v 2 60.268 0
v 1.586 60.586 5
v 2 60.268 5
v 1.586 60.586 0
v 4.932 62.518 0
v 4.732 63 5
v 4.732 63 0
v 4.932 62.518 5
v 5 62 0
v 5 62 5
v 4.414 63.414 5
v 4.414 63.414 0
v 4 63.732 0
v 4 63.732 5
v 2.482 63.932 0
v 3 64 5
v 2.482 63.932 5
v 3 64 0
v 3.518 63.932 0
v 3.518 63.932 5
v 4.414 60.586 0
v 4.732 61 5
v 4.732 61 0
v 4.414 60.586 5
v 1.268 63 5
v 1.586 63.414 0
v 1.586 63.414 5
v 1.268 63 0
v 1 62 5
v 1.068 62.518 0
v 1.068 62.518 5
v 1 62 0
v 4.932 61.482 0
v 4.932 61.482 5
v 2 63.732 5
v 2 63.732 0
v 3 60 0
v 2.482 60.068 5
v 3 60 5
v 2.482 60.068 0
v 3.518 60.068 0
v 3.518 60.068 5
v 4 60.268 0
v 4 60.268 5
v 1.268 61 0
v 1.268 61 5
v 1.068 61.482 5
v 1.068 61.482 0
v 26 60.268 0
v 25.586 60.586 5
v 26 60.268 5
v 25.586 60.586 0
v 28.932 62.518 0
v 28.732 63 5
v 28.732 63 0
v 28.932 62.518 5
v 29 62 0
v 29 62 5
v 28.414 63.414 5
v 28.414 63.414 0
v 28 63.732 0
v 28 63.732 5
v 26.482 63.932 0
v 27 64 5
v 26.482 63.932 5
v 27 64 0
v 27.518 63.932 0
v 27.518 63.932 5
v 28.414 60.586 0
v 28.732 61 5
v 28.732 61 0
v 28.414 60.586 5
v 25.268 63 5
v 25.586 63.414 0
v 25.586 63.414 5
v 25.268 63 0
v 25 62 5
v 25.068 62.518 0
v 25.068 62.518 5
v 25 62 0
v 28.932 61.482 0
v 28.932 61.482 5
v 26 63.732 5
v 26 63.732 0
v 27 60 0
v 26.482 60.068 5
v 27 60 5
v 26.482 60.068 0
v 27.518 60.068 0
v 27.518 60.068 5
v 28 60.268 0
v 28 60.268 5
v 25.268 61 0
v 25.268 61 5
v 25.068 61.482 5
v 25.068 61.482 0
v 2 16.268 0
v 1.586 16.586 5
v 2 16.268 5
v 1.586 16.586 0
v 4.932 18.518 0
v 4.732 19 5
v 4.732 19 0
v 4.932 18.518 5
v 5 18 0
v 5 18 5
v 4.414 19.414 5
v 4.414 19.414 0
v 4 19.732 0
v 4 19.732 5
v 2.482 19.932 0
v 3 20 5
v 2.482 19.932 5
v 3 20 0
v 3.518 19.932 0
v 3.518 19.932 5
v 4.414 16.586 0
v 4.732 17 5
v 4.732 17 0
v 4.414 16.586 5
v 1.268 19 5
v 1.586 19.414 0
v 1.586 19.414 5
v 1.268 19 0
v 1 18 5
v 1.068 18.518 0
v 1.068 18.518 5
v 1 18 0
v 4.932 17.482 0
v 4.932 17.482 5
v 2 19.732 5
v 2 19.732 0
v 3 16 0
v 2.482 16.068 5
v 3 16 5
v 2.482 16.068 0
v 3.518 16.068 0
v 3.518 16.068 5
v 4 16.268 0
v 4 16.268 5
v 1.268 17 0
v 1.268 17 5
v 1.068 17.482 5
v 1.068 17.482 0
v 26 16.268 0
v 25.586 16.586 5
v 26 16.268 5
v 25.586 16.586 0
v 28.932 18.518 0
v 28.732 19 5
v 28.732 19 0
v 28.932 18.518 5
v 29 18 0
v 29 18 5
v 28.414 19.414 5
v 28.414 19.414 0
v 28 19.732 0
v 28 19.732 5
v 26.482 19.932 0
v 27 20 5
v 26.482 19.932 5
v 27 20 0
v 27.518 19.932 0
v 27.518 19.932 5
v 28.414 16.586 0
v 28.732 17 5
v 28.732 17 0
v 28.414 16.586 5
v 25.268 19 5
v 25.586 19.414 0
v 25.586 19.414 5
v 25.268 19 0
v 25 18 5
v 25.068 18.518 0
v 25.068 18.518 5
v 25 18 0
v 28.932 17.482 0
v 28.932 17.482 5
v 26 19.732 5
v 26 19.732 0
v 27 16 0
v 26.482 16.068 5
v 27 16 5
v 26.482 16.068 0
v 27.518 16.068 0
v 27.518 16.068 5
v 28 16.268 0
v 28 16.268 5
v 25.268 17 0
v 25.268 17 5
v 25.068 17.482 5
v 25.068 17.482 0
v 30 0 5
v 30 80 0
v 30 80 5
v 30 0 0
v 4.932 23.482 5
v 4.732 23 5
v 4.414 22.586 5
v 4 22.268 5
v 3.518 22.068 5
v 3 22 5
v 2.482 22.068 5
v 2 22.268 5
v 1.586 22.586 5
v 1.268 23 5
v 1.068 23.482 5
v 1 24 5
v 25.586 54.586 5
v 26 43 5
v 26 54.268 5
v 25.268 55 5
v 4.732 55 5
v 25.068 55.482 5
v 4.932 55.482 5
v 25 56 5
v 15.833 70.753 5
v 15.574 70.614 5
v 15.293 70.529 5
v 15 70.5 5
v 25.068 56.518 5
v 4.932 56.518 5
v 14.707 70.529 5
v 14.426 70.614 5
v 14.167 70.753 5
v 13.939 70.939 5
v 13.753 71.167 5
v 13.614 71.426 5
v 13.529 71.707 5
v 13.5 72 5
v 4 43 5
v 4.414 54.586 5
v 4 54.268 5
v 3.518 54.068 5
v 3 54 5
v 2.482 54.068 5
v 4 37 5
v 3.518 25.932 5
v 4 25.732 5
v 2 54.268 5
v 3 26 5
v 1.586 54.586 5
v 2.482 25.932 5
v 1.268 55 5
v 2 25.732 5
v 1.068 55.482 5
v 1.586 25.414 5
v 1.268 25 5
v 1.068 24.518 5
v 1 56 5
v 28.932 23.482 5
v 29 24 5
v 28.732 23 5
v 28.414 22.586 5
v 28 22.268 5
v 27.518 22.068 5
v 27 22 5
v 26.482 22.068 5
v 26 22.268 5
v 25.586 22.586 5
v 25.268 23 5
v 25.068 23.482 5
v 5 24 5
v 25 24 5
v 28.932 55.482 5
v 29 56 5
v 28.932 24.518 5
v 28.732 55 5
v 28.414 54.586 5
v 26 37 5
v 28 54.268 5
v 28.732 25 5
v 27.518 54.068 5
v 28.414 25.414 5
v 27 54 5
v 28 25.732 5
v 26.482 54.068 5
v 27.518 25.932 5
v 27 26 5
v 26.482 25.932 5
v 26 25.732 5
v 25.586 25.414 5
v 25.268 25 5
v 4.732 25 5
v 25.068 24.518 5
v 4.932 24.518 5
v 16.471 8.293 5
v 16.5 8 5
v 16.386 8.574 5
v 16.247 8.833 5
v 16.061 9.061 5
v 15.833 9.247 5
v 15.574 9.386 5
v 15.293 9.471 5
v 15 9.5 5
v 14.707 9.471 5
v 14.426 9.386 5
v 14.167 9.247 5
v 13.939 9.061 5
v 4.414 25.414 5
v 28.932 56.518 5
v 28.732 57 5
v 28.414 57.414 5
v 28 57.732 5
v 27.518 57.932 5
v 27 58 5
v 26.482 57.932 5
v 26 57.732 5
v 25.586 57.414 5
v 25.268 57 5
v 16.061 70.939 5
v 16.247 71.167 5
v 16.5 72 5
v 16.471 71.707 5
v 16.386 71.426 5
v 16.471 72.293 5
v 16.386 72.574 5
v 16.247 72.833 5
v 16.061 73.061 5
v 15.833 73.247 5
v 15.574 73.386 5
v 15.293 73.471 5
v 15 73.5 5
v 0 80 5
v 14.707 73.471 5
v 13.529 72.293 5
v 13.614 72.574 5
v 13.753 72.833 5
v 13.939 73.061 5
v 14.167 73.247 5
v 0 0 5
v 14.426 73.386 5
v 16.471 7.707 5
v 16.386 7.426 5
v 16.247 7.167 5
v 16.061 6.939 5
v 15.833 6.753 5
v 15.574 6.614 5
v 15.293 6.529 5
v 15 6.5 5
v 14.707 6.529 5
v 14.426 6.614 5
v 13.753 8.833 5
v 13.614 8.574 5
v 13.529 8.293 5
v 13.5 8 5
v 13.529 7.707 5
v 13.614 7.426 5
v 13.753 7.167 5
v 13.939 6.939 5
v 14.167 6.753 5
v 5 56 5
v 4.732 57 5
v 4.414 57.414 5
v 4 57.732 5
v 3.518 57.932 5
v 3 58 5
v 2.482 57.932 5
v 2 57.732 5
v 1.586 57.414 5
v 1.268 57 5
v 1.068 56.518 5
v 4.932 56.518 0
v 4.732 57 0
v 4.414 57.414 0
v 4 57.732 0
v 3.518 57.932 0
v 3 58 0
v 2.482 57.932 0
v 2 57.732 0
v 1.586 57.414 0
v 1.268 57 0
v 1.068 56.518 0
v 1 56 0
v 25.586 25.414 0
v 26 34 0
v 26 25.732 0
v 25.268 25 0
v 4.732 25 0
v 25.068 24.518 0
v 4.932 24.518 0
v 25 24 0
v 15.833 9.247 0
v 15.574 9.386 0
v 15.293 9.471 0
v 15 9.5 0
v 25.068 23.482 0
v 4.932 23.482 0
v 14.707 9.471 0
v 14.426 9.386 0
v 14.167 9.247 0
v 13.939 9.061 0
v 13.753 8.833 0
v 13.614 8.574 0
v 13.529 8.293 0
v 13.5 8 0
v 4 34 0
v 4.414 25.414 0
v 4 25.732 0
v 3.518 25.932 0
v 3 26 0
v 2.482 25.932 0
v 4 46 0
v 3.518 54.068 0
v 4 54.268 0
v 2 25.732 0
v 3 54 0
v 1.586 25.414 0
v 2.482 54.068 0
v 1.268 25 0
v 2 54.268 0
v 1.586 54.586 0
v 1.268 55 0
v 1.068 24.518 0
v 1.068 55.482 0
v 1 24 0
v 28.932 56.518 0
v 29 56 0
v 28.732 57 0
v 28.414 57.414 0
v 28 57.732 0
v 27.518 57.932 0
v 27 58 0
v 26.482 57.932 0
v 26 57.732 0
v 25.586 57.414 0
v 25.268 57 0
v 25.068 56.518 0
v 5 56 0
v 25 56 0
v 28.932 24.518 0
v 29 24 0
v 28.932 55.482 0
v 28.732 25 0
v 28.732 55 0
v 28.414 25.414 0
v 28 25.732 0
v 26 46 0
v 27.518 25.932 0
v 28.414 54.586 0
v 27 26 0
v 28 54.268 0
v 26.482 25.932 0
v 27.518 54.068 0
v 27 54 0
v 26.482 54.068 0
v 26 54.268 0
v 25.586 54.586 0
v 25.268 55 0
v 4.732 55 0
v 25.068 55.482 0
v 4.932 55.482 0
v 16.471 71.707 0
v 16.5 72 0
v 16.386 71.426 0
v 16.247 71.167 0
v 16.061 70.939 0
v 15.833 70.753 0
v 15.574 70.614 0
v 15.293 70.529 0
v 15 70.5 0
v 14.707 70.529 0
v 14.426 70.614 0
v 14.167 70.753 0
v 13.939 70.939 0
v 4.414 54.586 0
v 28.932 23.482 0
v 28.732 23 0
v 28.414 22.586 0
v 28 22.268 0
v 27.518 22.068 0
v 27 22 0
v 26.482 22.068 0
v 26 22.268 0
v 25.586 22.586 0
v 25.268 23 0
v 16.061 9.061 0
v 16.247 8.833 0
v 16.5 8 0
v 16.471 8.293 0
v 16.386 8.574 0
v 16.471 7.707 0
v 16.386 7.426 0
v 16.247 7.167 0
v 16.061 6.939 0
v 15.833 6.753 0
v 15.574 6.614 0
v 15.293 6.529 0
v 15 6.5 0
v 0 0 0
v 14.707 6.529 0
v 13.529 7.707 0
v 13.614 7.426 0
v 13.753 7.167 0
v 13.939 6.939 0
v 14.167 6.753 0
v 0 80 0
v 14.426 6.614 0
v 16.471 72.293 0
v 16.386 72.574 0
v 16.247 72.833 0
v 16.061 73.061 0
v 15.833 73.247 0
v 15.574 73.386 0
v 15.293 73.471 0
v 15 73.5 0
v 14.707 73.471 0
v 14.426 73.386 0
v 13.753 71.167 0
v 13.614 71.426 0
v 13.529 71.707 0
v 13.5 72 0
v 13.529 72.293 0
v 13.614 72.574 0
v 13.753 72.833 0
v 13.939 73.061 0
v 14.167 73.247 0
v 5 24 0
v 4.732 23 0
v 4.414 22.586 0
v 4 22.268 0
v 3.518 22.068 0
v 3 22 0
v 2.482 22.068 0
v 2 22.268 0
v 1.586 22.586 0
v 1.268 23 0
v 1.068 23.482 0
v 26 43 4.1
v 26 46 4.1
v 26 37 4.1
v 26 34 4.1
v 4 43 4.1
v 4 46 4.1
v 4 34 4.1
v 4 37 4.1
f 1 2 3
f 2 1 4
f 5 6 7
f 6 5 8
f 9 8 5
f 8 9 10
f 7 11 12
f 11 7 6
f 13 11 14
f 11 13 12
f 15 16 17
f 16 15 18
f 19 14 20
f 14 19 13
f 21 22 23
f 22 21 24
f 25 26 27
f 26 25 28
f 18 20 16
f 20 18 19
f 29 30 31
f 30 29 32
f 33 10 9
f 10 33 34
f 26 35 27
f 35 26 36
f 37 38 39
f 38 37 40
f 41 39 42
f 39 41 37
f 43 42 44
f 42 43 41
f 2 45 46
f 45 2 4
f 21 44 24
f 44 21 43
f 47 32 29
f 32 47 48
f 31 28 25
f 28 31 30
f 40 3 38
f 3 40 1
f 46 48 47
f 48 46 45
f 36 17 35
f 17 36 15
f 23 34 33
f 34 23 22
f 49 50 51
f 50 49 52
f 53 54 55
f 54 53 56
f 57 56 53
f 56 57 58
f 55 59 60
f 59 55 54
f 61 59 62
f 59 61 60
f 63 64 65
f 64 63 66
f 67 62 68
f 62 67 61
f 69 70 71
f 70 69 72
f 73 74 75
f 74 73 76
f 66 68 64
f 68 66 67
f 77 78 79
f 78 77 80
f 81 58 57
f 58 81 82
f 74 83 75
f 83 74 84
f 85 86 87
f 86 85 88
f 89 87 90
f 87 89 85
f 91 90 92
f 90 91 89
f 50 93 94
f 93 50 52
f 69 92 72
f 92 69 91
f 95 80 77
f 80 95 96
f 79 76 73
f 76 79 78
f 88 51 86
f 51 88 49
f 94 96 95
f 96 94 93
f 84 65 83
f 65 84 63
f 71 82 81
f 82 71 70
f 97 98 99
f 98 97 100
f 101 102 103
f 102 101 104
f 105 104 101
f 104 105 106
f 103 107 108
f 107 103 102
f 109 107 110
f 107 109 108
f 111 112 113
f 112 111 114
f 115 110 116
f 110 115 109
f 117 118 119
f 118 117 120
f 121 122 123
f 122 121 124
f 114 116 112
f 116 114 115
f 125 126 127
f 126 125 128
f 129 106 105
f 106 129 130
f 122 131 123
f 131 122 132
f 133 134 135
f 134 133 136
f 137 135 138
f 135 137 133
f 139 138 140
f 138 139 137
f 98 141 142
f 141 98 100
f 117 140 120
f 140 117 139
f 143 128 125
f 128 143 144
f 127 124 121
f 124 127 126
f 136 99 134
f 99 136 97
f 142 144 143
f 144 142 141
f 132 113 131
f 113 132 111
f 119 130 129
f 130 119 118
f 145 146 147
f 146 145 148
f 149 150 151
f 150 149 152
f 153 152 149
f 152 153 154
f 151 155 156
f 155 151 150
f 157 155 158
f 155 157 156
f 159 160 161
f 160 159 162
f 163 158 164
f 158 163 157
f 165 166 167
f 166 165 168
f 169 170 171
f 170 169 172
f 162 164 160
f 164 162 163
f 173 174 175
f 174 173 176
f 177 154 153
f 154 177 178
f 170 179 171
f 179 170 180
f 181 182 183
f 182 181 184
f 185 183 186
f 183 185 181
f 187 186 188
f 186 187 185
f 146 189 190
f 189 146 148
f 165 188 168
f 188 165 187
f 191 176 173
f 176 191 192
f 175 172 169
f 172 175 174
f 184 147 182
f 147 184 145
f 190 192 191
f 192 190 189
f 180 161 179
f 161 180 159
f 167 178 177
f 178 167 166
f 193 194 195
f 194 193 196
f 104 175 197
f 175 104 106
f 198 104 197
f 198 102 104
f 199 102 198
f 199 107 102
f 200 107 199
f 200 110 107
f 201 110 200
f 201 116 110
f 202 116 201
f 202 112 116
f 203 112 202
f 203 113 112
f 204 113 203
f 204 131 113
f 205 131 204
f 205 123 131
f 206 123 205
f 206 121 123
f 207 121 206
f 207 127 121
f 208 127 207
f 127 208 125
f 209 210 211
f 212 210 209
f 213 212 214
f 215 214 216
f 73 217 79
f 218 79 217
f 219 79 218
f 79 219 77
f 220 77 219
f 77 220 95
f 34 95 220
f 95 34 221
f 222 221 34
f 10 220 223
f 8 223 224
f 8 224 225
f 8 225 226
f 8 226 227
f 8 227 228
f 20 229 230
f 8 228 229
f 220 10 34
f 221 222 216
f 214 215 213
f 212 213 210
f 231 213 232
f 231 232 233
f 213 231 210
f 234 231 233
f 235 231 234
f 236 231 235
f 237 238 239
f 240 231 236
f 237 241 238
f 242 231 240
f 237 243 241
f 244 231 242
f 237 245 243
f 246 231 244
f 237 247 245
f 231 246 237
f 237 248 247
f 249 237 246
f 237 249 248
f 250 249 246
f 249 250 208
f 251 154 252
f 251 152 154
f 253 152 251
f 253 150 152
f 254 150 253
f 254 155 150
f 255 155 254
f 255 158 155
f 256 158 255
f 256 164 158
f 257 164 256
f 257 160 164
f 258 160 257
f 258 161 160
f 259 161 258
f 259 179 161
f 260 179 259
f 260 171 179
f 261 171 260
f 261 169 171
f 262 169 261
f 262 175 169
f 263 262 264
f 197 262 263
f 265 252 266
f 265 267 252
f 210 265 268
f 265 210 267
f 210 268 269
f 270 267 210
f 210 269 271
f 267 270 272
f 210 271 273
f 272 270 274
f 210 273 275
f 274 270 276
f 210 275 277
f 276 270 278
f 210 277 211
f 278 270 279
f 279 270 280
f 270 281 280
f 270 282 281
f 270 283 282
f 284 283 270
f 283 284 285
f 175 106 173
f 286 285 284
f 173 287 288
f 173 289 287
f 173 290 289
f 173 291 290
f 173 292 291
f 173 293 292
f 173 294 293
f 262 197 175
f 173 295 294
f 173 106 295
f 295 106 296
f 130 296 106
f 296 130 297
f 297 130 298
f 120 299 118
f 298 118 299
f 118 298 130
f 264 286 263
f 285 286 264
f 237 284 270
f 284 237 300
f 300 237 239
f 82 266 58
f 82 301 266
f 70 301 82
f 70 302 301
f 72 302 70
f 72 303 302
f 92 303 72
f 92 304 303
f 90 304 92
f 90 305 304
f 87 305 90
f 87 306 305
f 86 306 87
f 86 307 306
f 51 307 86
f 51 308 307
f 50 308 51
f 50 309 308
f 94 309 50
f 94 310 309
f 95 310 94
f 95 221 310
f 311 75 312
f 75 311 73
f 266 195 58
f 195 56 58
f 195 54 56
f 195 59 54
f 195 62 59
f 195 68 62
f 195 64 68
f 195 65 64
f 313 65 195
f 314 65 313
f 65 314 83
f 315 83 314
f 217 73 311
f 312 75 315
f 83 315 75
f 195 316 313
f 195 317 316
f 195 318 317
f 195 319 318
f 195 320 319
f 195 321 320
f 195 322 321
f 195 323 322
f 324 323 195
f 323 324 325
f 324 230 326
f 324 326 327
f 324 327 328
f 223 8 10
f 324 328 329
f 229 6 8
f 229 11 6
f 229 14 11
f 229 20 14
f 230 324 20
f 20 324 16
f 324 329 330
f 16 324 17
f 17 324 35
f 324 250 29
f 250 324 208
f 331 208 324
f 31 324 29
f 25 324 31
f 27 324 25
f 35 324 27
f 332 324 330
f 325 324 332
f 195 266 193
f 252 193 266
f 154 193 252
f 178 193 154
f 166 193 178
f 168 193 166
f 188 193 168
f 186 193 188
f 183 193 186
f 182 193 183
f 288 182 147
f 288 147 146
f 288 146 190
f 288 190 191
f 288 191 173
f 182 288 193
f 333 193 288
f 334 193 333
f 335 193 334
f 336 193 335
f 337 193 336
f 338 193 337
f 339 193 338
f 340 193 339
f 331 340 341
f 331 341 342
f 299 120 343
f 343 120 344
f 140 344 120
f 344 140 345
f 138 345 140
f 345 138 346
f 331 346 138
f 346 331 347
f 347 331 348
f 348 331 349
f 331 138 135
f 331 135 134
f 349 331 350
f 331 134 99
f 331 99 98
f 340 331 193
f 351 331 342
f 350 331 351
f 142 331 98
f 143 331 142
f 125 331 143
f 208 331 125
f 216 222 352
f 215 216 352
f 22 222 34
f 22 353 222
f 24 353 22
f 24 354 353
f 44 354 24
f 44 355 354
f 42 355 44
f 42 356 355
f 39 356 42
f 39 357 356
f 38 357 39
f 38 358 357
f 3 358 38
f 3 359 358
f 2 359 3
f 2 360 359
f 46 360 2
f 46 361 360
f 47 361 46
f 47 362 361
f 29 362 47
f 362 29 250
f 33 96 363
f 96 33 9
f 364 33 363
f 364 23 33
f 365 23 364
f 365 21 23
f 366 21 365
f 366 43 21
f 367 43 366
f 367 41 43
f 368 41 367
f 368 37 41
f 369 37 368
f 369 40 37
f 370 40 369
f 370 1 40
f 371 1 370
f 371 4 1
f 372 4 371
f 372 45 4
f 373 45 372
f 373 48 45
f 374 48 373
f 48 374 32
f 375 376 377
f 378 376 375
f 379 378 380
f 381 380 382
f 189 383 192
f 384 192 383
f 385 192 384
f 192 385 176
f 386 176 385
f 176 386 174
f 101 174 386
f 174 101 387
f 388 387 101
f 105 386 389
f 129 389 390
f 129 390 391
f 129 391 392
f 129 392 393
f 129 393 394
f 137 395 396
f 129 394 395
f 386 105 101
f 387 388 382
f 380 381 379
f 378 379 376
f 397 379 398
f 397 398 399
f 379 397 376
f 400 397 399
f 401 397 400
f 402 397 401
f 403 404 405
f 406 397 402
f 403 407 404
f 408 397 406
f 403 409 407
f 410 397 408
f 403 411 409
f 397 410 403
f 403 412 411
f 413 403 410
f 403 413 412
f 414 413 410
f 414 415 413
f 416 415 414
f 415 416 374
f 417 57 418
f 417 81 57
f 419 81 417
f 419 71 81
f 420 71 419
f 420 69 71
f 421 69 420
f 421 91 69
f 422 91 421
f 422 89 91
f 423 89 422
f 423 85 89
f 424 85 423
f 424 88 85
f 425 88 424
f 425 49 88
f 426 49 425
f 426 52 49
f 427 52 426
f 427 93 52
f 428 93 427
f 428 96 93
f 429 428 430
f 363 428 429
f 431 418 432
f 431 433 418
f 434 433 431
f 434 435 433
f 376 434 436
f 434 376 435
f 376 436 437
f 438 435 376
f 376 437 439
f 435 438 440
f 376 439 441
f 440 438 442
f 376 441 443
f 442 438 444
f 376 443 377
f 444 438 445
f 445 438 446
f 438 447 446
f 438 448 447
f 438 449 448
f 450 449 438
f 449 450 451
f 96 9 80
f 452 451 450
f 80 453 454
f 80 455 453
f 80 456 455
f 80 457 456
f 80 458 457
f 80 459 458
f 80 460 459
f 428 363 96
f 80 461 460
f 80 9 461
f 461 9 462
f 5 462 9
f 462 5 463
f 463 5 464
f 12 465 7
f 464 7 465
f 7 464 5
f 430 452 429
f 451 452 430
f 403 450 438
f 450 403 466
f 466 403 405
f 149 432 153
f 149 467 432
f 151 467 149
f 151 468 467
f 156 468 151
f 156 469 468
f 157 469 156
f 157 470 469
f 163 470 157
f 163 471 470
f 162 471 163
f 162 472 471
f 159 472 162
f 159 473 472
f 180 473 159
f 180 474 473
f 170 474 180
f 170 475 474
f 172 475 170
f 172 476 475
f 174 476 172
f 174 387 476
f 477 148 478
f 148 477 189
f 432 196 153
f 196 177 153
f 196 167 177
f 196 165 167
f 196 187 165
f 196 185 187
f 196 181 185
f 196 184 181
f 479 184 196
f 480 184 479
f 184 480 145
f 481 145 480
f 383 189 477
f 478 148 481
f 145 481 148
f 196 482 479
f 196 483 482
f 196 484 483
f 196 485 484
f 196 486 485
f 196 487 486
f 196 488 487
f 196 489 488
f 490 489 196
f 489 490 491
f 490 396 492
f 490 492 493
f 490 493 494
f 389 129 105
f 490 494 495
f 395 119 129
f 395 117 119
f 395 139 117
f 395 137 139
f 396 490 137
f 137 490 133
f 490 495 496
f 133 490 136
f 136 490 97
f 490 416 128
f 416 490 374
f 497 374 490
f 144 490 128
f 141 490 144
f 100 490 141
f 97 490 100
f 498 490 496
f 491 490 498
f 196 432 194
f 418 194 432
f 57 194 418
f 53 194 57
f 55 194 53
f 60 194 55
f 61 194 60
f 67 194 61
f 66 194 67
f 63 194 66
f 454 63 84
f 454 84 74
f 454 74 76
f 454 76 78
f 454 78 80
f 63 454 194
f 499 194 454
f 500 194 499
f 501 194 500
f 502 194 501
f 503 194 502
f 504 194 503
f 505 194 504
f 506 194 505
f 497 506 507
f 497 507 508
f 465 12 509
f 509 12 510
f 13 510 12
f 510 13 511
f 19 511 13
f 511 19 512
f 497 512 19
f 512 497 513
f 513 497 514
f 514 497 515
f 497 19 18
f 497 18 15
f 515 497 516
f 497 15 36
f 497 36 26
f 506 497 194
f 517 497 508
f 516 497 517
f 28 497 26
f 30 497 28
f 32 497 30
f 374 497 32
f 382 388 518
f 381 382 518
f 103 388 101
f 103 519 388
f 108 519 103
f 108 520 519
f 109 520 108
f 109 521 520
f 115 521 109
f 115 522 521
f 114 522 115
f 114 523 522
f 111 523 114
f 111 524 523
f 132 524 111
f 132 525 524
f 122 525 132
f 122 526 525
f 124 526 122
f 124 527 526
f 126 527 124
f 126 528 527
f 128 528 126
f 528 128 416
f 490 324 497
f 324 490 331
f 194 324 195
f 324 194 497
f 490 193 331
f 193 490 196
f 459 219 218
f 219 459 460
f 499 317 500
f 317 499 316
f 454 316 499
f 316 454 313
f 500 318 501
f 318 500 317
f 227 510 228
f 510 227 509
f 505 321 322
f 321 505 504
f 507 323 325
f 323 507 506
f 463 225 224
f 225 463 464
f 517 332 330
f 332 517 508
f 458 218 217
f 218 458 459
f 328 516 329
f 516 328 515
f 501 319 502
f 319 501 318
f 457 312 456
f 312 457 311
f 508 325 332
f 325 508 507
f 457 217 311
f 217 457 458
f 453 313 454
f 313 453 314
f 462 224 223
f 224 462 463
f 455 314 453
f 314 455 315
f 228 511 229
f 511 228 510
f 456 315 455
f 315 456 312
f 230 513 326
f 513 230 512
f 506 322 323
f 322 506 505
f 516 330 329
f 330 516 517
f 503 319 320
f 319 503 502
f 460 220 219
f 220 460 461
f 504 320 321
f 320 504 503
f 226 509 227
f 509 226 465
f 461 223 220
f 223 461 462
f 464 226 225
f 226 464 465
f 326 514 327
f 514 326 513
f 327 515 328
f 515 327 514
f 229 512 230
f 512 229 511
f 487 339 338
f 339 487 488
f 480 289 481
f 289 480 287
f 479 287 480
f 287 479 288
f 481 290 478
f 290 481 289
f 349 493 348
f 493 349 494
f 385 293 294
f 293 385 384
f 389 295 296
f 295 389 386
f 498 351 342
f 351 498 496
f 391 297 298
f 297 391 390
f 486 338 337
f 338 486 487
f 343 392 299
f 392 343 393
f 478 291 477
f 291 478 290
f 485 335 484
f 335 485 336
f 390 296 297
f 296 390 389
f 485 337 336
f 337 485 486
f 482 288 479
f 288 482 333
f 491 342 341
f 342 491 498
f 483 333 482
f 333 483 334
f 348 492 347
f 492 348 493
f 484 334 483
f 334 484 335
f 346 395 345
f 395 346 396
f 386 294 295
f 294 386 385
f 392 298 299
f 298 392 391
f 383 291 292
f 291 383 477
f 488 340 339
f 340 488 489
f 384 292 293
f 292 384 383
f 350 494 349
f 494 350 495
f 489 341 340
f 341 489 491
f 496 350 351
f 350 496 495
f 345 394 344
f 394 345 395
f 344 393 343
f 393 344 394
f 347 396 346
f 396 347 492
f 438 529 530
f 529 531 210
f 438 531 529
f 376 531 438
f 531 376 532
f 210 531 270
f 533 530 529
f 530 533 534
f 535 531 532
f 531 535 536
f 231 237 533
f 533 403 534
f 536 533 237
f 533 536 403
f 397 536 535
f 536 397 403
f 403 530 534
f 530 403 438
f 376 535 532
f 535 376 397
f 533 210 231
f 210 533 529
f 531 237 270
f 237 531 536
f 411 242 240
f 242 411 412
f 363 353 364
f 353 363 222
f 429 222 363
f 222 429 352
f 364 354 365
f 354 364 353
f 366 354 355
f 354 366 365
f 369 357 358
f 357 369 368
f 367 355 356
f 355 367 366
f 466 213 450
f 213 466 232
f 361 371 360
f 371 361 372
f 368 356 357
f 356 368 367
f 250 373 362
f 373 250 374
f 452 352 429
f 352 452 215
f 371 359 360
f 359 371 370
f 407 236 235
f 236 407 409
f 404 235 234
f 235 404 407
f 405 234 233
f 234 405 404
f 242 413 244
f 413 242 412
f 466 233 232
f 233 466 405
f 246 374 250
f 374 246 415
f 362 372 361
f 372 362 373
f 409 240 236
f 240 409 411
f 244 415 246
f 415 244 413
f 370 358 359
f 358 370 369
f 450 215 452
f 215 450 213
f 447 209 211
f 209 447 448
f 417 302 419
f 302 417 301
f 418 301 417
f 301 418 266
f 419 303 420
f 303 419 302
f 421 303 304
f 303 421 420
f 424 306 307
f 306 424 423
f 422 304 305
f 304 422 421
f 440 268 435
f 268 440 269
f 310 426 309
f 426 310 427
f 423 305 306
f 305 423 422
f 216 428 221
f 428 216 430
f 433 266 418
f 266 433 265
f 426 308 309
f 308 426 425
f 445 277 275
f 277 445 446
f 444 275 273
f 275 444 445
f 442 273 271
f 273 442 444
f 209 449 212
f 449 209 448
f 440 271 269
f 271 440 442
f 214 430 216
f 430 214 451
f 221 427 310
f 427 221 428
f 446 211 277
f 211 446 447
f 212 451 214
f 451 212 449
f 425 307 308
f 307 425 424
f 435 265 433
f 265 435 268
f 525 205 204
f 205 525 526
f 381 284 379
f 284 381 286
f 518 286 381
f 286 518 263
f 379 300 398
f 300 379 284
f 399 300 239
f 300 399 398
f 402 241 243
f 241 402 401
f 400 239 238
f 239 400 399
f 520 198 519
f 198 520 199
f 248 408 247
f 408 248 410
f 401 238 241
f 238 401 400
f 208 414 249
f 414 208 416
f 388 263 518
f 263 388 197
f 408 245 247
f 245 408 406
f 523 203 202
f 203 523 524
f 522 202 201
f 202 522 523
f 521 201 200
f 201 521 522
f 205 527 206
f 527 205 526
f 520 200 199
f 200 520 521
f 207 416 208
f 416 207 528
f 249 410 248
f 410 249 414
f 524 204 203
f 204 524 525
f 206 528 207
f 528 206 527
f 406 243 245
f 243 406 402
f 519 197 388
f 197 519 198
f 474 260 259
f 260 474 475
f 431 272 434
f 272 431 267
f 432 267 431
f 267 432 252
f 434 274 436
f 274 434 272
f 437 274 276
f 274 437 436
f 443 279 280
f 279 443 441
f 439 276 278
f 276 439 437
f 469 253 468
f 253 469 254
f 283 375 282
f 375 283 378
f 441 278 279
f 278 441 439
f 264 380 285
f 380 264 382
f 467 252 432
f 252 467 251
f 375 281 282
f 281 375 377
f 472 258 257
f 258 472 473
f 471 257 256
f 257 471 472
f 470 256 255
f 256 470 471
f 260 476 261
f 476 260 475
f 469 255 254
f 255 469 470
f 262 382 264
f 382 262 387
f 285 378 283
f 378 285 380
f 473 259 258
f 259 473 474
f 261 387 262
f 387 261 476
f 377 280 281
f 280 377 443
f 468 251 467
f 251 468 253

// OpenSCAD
//
// 6m Vertical Dipole Center Insulator
// For dual-banana-to-BNC adapter + wire elements
// N1RWJ helper
//

// ---------------------
// Parameters
// ---------------------

plate_width      = 30;   // mm
plate_height     = 80;   // mm
plate_thickness  = 5;    // mm

// Wire holes
wire_hole_d      = 3;    // diameter for 22 AWG with insulation
wire_margin      = 8;    // distance from top/bottom edge to hole center

// Banana adapter slot (approx; tweak if needed)
banana_slot_width  = 22; // left-right opening for adapter body
banana_slot_height = 12; // up-down opening for adapter body
banana_slot_depth  = 4;  // how deep the recess is (into plate thickness)

// Vertical position of slot center (in mm from bottom)
banana_slot_center_y = plate_height / 2;

// Zip-tie holes
zip_hole_d         = 4;  // for typical small zip ties
zip_hole_offset_y  = 10; // vertical spacing above/below slot
zip_hole_edge_margin = 3; // distance from plate side edge

// Optional: mast lash holes (for lashing to mast)
// Turn off if you don't need them
enable_mast_holes = true;
mast_hole_d       = 4;
// Keep these farther from the zip holes to avoid overlap
mast_hole_offset_y = 18;

// ---------------------
// Main model
// ---------------------

difference() {
    // Base plate
    cube([plate_width, plate_height, plate_thickness], center = false);

    // -----------------
    // Wire holes
    // -----------------
    // Top wire hole (upper element)
    translate([plate_width/2, plate_height - wire_margin, plate_thickness/2])
        cylinder(d = wire_hole_d, h = plate_thickness + 0.2, center = true, $fn=32);

    // Bottom wire hole (lower element)
    translate([plate_width/2, wire_margin, plate_thickness/2])
        cylinder(d = wire_hole_d, h = plate_thickness + 0.2, center = true, $fn=32);

    // -----------------
    // Banana adapter slot
    // -----------------
    translate([
        (plate_width - banana_slot_width)/2,
        banana_slot_center_y - banana_slot_height/2,
        0
    ])
        cube([banana_slot_width, banana_slot_height, banana_slot_depth + 0.1], center = false);

    // Through-cut for adapter posts (optional, in case you want them to poke fully through)
    // Centered horizontally, narrower in height
    translate([
        (plate_width - banana_slot_width)/2,
        banana_slot_center_y - banana_slot_height/4,
        0
    ])
        cube([banana_slot_width, banana_slot_height/2, plate_thickness + 0.2], center = false);

    // -----------------
    // Zip-tie holes: one pair above, one pair below the slot
    // -----------------
    // Above slot
    translate([zip_hole_edge_margin, banana_slot_center_y + banana_slot_height/2 + zip_hole_offset_y, plate_thickness/2])
        cylinder(d = zip_hole_d, h = plate_thickness + 0.2, center = true, $fn=24);

    translate([plate_width - zip_hole_edge_margin, banana_slot_center_y + banana_slot_height/2 + zip_hole_offset_y, plate_thickness/2])
        cylinder(d = zip_hole_d, h = plate_thickness + 0.2, center = true, $fn=24);

    // Below slot
    translate([zip_hole_edge_margin, banana_slot_center_y - banana_slot_height/2 - zip_hole_offset_y, plate_thickness/2])
        cylinder(d = zip_hole_d, h = plate_thickness + 0.2, center = true, $fn=24);

    translate([plate_width - zip_hole_edge_margin, banana_slot_center_y - banana_slot_height/2 - zip_hole_offset_y, plate_thickness/2])
        cylinder(d = zip_hole_d, h = plate_thickness + 0.2, center = true, $fn=24);

    // -----------------
    // Mast lash holes (optional)
    // -----------------
    if (enable_mast_holes) {
        // Upper mast lash holes
        translate([zip_hole_edge_margin, plate_height - mast_hole_offset_y, plate_thickness/2])
            cylinder(d = mast_hole_d, h = plate_thickness + 0.2, center = true, $fn=24);

        translate([plate_width - zip_hole_edge_margin, plate_height - mast_hole_offset_y, plate_thickness/2])
            cylinder(d = mast_hole_d, h = plate_thickness + 0.2, center = true, $fn=24);

        // Lower mast lash holes
        translate([zip_hole_edge_margin, mast_hole_offset_y, plate_thickness/2])
            cylinder(d = mast_hole_d, h = plate_thickness + 0.2, center = true, $fn=24);

        translate([plate_width - zip_hole_edge_margin, mast_hole_offset_y, plate_thickness/2])
            cylinder(d = mast_hole_d, h = plate_thickness + 0.2, center = true, $fn=24);
    }
}
